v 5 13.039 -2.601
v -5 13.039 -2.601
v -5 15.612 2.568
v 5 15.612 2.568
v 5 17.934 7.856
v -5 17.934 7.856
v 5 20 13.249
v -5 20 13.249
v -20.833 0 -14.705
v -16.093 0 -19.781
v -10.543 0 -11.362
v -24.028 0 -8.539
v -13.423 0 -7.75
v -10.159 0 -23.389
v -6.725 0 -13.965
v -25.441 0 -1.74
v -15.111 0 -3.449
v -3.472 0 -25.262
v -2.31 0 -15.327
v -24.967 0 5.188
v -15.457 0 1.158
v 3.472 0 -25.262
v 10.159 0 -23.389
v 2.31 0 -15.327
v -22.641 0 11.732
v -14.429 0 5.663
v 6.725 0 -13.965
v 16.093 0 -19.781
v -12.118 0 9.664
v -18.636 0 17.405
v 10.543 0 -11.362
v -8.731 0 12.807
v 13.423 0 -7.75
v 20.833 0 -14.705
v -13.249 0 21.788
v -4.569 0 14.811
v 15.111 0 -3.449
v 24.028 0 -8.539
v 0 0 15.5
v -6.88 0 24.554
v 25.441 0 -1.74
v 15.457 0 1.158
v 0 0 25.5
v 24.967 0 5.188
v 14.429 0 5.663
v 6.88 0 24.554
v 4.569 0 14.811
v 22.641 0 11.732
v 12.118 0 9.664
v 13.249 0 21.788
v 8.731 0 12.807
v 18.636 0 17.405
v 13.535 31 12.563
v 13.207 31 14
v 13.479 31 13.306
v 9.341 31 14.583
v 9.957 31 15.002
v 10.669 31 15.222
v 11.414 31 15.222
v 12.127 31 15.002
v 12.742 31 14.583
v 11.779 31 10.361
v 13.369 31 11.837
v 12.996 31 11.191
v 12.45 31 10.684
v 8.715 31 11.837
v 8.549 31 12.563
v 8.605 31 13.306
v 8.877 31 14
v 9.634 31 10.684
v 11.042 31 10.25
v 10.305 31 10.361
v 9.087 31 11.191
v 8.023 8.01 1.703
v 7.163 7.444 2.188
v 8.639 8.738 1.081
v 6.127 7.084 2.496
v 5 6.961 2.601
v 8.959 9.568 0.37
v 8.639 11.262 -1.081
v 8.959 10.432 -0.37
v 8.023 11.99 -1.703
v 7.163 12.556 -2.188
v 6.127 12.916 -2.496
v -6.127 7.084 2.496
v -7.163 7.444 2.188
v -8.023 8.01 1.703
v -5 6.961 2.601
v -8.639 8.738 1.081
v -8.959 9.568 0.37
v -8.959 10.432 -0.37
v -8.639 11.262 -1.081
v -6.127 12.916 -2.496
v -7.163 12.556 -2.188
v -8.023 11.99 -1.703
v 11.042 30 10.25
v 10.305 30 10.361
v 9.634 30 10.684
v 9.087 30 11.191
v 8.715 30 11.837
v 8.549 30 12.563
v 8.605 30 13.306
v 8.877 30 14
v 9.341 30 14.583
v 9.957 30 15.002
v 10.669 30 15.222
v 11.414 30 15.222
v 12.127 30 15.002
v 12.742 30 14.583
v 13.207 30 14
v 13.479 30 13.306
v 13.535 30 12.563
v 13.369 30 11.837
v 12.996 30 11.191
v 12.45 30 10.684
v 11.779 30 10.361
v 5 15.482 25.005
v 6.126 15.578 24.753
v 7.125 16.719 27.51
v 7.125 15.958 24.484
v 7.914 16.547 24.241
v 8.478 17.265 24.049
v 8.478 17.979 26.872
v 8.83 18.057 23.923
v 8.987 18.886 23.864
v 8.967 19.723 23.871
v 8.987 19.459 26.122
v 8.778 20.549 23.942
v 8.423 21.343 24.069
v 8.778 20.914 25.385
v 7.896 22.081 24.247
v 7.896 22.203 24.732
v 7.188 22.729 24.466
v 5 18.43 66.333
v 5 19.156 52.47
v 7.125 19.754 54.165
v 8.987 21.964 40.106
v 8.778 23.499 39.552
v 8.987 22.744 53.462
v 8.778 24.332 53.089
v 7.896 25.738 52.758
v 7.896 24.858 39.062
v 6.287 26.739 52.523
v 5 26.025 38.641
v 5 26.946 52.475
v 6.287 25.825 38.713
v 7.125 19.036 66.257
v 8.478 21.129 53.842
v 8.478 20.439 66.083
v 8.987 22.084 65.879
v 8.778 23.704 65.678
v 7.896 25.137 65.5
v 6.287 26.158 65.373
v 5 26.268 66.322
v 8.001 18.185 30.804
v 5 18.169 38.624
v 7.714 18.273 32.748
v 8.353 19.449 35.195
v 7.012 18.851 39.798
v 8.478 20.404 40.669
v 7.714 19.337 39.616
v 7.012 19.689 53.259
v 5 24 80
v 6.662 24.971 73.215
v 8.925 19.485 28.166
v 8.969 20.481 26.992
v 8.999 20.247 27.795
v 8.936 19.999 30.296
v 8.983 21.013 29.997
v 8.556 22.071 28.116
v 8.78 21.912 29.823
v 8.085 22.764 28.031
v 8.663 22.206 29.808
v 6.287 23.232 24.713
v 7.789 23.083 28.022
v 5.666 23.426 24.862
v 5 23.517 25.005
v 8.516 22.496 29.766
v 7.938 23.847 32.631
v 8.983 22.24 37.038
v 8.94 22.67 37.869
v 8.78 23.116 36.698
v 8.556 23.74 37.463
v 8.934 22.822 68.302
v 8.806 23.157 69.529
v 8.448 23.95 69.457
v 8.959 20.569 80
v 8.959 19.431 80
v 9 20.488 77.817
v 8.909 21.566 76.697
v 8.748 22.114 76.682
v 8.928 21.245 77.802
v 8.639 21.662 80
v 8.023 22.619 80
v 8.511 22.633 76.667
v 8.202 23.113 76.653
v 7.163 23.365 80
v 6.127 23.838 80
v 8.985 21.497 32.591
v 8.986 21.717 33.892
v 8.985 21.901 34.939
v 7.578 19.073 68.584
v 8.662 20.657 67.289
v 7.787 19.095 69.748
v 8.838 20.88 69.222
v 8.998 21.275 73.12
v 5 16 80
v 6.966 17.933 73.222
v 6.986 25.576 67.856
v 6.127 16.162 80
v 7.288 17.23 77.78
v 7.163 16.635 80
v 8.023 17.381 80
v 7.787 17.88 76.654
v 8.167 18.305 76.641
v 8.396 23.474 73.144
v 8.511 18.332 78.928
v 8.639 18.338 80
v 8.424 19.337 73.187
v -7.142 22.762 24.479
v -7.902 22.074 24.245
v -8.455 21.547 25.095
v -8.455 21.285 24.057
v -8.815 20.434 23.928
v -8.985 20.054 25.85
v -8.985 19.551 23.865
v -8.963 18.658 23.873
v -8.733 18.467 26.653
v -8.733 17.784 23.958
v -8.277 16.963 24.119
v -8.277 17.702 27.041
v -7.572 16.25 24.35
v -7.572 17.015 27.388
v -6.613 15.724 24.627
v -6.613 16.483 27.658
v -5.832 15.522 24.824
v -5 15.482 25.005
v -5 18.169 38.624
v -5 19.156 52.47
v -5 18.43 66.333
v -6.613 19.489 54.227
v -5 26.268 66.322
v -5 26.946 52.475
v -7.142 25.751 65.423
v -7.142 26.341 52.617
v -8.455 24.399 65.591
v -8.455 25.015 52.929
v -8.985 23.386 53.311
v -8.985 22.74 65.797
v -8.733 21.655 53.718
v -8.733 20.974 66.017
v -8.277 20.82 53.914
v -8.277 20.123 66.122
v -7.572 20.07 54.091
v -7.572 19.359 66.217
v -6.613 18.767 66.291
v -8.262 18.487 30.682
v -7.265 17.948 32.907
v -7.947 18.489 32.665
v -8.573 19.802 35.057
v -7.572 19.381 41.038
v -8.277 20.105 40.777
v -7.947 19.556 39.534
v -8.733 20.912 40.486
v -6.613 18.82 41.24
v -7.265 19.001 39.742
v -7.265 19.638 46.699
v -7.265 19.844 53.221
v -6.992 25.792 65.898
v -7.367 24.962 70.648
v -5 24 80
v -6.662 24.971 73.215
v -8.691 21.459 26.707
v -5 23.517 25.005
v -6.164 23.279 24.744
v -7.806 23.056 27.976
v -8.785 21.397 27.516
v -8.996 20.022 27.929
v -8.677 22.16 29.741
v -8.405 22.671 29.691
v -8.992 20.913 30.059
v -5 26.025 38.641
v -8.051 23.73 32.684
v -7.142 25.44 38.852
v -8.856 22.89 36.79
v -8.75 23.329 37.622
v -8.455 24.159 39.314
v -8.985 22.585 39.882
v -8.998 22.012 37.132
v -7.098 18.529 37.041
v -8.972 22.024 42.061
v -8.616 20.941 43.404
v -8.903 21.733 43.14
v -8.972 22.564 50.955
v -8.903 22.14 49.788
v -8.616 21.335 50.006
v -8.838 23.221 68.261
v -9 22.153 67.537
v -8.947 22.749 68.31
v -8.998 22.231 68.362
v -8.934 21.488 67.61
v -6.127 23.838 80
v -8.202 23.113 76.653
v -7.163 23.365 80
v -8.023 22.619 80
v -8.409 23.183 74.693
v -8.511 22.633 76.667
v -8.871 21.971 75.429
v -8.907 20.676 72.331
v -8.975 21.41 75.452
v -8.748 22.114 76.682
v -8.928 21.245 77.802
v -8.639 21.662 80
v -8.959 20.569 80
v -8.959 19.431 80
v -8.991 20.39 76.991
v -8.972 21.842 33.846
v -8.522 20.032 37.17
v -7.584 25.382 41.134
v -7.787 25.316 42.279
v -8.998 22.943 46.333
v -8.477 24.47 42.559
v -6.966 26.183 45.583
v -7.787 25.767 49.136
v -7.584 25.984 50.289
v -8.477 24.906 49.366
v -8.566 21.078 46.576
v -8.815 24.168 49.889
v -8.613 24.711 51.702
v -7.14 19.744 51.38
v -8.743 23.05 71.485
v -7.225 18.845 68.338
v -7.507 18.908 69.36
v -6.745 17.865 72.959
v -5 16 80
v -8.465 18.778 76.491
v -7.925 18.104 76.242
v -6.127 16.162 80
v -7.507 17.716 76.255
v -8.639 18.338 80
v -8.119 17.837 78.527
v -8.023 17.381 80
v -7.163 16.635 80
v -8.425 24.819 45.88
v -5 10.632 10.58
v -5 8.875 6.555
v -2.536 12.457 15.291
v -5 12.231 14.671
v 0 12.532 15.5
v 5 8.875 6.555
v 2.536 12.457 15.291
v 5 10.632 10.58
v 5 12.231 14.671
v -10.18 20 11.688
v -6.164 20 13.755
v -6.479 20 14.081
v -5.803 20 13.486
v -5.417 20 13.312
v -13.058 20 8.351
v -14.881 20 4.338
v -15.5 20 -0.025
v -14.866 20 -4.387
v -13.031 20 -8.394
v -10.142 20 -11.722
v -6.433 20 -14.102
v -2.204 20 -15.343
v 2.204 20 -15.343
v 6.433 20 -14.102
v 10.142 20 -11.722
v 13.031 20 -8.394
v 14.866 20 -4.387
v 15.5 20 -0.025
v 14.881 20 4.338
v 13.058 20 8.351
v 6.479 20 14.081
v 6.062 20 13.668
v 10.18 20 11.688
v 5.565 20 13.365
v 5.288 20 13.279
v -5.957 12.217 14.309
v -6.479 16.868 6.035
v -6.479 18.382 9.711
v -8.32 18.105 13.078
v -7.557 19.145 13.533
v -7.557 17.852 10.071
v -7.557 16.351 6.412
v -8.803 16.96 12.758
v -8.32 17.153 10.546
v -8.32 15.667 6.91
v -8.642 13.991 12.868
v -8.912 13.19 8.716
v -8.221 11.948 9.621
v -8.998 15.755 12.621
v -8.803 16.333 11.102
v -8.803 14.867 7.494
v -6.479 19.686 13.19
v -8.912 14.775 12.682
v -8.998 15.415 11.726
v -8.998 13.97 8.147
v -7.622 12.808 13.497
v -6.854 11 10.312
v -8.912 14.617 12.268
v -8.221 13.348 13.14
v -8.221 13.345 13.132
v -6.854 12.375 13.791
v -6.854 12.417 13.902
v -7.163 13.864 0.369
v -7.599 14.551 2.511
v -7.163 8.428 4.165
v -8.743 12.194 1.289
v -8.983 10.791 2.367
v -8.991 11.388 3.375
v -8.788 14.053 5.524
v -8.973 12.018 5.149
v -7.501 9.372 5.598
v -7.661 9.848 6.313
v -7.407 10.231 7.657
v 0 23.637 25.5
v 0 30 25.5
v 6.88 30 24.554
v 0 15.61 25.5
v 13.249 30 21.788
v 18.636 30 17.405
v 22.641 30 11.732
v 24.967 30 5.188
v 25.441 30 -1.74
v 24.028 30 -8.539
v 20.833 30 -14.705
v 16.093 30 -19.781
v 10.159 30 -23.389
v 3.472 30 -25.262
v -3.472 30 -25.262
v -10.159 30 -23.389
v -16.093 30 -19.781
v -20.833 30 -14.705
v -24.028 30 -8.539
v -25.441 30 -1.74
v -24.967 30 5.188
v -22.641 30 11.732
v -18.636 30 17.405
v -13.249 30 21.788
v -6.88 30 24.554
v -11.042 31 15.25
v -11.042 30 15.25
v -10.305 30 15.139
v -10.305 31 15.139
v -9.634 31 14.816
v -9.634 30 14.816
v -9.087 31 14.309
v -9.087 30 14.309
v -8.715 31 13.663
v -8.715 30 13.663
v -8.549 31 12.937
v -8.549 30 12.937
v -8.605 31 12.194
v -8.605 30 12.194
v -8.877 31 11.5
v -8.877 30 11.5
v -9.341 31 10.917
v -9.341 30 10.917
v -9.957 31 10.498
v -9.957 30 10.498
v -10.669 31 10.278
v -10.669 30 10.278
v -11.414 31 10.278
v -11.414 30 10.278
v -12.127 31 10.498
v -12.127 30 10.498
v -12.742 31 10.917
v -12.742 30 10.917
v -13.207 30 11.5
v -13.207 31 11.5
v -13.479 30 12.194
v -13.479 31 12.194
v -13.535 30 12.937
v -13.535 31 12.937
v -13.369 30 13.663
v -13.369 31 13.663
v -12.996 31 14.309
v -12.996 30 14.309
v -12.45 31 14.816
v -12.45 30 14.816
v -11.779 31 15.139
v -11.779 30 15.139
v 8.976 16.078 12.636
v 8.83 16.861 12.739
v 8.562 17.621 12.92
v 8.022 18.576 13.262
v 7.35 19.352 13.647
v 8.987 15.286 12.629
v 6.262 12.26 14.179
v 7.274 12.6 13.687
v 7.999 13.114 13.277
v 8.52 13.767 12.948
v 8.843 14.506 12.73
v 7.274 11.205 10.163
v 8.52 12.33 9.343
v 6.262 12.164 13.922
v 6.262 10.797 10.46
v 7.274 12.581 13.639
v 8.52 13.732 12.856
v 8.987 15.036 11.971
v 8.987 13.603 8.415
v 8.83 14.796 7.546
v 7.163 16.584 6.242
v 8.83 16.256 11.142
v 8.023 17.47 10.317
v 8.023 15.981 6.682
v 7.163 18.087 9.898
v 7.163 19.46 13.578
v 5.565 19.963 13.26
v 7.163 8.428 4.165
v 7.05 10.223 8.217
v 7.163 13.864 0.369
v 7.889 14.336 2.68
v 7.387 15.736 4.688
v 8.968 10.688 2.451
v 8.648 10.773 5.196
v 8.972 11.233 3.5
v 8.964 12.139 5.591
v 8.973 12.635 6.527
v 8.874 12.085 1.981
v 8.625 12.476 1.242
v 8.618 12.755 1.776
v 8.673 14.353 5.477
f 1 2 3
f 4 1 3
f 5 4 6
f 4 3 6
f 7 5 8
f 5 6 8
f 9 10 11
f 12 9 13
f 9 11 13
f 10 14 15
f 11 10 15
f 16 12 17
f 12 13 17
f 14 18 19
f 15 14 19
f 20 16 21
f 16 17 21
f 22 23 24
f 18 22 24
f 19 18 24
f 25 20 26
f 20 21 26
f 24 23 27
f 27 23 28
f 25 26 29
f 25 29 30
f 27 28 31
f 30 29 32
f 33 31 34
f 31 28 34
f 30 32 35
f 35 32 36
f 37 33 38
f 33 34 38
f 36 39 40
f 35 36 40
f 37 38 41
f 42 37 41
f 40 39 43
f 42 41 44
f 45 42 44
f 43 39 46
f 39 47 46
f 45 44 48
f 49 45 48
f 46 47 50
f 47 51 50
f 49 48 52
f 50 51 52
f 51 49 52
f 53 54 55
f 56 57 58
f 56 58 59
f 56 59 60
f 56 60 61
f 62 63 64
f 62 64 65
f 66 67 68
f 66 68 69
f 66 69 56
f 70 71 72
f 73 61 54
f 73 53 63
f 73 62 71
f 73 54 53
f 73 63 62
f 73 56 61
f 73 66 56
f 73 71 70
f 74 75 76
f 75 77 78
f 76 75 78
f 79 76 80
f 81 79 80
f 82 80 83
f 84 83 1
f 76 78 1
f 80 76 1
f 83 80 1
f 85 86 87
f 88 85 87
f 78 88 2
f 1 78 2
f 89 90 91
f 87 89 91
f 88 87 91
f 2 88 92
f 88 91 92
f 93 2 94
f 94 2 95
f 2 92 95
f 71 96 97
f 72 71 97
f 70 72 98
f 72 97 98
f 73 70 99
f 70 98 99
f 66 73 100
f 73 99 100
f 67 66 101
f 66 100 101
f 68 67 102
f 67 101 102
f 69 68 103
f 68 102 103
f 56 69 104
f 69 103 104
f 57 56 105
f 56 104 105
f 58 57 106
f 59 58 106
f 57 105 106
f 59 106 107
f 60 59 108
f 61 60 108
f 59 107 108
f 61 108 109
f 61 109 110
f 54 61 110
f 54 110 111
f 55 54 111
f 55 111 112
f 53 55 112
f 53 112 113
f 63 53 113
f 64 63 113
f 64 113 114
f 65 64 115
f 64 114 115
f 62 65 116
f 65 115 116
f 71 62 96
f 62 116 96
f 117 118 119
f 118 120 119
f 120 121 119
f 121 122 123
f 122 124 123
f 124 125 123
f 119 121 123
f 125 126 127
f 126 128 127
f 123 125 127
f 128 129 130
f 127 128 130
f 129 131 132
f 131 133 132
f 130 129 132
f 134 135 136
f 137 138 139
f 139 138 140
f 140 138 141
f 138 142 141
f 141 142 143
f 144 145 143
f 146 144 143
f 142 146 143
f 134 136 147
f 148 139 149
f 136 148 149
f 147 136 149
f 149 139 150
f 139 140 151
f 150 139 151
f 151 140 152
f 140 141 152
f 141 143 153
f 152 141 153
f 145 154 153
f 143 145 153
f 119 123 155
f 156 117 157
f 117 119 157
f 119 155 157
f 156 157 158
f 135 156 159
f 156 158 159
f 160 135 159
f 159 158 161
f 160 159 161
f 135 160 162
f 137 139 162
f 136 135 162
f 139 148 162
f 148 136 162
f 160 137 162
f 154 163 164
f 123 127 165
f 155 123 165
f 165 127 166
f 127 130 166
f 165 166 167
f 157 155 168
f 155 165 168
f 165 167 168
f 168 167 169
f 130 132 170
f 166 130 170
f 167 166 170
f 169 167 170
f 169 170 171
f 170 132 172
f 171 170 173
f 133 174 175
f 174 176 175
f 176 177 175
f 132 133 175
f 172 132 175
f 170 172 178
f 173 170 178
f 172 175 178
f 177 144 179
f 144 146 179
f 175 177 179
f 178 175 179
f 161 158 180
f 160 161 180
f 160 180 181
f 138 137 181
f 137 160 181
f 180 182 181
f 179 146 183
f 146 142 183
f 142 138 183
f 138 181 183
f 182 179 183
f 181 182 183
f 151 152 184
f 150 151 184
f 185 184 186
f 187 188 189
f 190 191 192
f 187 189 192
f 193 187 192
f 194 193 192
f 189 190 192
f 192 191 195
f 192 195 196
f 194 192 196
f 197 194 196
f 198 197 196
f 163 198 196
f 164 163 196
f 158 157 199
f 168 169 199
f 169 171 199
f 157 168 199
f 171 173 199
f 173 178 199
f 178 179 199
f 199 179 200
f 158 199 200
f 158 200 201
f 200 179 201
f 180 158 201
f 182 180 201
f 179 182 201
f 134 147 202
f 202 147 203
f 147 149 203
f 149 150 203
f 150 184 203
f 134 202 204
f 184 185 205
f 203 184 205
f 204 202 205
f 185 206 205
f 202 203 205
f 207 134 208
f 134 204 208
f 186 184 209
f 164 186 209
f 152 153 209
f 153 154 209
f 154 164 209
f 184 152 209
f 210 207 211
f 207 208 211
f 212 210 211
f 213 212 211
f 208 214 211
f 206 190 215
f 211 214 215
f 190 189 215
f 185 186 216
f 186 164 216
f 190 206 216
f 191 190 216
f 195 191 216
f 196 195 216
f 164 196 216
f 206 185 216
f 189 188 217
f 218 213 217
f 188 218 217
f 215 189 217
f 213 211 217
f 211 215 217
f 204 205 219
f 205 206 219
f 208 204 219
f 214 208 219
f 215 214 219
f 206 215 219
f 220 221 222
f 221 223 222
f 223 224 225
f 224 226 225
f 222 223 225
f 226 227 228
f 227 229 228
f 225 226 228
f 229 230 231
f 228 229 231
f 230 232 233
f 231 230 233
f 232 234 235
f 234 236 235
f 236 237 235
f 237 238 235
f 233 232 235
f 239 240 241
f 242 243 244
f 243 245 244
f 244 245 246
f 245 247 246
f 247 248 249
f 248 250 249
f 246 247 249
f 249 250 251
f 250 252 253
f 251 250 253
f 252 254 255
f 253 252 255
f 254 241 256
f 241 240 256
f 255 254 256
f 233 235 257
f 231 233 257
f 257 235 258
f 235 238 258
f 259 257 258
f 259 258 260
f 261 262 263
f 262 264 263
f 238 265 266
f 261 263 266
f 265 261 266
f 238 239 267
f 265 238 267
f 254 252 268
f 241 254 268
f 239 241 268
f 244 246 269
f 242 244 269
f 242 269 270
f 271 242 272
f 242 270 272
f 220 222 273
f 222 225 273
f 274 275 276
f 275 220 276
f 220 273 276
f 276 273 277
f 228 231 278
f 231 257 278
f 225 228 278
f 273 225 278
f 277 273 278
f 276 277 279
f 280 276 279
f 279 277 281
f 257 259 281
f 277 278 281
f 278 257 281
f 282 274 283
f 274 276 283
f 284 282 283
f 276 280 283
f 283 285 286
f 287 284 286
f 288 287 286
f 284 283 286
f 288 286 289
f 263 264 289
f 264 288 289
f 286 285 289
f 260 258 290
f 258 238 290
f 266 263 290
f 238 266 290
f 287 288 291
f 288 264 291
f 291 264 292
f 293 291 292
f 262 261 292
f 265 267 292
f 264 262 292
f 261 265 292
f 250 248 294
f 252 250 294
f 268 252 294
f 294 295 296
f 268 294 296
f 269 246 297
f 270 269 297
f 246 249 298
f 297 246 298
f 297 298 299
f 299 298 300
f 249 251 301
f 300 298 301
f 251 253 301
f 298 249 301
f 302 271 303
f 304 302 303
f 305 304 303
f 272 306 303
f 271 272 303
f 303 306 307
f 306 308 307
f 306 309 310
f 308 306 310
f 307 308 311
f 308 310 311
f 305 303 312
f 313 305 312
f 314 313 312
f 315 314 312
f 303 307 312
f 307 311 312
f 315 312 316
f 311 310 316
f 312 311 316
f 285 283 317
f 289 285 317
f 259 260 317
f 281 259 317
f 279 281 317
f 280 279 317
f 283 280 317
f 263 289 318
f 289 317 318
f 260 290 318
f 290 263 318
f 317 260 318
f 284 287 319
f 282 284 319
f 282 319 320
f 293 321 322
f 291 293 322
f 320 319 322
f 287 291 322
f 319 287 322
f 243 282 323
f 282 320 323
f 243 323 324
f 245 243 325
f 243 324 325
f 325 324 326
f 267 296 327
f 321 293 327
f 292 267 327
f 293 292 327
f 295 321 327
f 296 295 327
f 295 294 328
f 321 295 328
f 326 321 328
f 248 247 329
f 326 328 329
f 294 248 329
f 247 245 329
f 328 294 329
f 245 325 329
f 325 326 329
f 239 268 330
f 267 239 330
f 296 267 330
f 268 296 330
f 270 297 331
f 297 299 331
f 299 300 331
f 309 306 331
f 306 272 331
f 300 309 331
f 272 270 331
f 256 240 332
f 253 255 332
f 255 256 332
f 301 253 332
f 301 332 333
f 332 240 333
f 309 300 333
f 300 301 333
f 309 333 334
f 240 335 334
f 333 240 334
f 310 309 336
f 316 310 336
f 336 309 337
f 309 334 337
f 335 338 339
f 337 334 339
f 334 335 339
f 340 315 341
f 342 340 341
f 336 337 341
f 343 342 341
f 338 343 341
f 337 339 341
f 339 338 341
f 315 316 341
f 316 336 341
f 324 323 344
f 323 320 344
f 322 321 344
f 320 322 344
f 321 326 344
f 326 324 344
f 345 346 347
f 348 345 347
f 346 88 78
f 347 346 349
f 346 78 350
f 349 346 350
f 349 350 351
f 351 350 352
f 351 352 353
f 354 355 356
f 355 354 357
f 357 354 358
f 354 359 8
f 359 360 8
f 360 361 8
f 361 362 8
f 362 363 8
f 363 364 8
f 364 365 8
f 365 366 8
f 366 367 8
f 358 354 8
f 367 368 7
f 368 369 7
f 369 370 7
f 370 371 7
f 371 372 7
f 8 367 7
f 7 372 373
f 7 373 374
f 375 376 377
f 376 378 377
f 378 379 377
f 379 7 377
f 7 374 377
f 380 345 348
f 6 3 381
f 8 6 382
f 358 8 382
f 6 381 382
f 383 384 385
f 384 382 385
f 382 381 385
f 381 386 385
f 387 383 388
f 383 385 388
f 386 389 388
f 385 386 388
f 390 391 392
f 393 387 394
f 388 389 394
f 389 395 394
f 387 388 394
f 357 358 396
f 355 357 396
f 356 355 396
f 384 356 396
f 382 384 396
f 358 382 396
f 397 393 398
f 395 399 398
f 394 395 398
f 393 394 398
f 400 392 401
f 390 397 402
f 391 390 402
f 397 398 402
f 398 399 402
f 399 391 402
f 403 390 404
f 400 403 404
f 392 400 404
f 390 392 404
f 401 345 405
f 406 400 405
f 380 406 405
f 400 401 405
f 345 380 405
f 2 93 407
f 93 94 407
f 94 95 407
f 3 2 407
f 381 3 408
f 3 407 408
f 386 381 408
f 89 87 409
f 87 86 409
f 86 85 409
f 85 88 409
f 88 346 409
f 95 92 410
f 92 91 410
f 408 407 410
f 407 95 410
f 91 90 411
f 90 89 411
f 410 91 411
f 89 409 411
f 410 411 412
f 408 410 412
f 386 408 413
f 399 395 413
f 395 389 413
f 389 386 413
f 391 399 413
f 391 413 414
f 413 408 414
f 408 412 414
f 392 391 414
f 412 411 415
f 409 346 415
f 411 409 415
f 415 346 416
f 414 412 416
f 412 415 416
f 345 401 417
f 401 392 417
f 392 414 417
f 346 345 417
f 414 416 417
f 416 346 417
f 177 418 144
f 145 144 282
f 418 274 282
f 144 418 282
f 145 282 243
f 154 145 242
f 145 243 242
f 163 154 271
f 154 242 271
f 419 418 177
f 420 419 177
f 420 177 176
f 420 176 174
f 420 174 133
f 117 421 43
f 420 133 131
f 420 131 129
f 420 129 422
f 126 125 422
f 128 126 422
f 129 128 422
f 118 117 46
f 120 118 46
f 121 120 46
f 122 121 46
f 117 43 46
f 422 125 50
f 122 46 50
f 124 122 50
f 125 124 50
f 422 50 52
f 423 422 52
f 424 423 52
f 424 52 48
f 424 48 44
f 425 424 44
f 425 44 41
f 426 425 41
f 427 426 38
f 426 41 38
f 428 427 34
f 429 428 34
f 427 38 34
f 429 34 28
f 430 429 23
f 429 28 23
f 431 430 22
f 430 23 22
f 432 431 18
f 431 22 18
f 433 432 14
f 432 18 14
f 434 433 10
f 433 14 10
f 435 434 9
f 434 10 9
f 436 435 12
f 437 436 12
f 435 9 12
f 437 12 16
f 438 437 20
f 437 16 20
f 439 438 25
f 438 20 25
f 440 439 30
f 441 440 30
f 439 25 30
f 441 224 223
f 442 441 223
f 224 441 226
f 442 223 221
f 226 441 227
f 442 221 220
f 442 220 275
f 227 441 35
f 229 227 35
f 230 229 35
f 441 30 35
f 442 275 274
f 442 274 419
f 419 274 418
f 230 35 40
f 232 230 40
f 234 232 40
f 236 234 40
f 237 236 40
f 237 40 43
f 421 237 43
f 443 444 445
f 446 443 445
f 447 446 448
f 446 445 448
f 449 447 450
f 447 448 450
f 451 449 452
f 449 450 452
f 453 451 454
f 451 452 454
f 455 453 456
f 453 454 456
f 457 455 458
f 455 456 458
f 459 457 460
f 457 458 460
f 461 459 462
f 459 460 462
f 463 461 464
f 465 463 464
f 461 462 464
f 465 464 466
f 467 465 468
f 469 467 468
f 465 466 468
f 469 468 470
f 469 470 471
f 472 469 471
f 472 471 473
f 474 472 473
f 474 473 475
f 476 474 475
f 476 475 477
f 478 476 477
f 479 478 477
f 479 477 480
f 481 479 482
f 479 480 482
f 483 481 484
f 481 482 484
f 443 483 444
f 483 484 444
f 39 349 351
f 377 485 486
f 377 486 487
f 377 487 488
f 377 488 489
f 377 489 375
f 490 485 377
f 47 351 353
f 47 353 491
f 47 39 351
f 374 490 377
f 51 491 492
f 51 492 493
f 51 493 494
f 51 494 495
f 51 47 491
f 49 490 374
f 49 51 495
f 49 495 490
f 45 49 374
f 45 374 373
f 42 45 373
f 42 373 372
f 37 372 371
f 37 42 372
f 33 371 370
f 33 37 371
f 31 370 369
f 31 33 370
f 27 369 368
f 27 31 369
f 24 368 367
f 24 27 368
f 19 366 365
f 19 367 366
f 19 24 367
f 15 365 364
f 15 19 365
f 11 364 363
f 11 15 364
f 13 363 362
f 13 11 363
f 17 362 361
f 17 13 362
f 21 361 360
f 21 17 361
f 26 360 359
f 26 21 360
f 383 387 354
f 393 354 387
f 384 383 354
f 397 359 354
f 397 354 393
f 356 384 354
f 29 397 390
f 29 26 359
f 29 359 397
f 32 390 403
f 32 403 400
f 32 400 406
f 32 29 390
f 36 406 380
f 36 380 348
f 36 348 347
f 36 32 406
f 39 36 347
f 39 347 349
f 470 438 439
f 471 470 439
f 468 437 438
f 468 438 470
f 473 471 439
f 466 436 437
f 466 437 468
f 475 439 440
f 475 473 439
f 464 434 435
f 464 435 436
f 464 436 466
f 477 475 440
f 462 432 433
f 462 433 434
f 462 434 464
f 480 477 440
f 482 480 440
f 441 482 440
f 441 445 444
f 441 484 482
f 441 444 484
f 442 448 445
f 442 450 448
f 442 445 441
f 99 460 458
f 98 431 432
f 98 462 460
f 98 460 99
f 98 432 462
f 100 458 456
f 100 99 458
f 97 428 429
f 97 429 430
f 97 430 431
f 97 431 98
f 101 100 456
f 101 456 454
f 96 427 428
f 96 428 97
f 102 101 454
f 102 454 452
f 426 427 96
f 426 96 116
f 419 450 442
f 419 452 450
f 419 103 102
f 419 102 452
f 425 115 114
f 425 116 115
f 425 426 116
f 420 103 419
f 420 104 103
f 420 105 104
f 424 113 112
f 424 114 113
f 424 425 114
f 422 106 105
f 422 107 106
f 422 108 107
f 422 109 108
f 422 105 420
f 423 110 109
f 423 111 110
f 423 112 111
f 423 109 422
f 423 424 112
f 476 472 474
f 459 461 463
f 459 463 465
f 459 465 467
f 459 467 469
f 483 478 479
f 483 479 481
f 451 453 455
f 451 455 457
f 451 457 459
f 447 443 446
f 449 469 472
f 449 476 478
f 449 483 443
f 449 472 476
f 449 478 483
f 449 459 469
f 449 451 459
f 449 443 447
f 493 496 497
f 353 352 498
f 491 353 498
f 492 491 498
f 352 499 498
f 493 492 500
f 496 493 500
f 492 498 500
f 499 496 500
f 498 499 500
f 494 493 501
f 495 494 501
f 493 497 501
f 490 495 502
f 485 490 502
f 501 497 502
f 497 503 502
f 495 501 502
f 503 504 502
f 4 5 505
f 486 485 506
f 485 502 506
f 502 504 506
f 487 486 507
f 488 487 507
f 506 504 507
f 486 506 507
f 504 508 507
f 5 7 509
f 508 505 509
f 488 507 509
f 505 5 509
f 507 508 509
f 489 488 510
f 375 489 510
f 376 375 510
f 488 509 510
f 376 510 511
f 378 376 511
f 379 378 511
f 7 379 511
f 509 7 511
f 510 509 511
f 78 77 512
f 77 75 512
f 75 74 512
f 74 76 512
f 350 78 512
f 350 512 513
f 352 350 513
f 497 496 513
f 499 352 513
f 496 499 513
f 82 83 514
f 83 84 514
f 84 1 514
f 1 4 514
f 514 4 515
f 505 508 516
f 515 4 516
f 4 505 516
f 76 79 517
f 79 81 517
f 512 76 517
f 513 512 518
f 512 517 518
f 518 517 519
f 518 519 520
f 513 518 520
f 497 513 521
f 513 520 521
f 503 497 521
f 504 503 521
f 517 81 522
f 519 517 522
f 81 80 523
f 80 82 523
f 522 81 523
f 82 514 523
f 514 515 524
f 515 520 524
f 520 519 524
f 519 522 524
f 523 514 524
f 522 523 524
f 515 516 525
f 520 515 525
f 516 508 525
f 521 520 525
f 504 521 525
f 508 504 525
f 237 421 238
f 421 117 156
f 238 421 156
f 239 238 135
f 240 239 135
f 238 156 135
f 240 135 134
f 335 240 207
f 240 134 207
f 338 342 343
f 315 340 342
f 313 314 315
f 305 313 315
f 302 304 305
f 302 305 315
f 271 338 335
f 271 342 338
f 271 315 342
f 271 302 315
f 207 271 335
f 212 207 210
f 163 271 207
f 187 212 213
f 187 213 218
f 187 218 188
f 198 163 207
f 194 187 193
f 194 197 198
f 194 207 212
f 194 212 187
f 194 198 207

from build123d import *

# Parameters (mm, degrees)
SKETCH1_R           = 25.5
BOSS_EXTRUDE1_DEPTH = 30
SHELL1_T            = -10
SKETCH6_R           = 2.5
BOSS_EXTRUDE2_DEPTH = 1


with BuildPart() as part:
    # Sketch1 → Boss-Extrude1 (new body)
    with BuildSketch(Plane(origin=(0, 0, 0), x_dir=(1, 0, 0), z_dir=(0, 1, 0))):
        with Locations(Location((0, 0, 0), (0, 0, 270))):
            Circle(SKETCH1_R)
    extrude(amount=BOSS_EXTRUDE1_DEPTH)

    # Shell1
    shell1_openings = [part.faces().sort_by_distance(p)[0] for p in [
        (0, 0, 0),
    ]]
    offset(amount=SHELL1_T, openings=shell1_openings, kind=Kind.INTERSECTION)

    # Sweep1: sweep along a path in Sketch5
    with BuildLine(Plane(origin=(0, 0, 0), x_dir=(0, 0, -1), z_dir=(1, 0, 0))) as sweep1_path:
        ThreePointArc((0, 10), (-39.105669761, 22.154641912), (-80, 20))
    # Sketch4 → Sweep1 (sweep)
    with BuildSketch(Plane.XY.offset(80)):
        with BuildLine():
            Line((5, 16), (-5, 16))
            ThreePointArc((-5, 16), (-9, 20), (-5, 24))
            Line((-5, 24), (5, 24))
            ThreePointArc((5, 24), (9, 20), (5, 16))
        make_face()
    sweep(path=sweep1_path.line)

    # Sketch6 → Boss-Extrude2 (add)
    with BuildSketch(Plane(origin=(0, 30, 0), x_dir=(1, 0, 0), z_dir=(0, 1, 0))):
        with Locations(Location((-11.041823898, -12.75, 0), (0, 0, 270))):
            Circle(SKETCH6_R)
        with Locations(Location((11.041823898, -12.75, 0), (0, 0, 90))):
            Circle(SKETCH6_R)
    extrude(amount=BOSS_EXTRUDE2_DEPTH)


solid = part.part
